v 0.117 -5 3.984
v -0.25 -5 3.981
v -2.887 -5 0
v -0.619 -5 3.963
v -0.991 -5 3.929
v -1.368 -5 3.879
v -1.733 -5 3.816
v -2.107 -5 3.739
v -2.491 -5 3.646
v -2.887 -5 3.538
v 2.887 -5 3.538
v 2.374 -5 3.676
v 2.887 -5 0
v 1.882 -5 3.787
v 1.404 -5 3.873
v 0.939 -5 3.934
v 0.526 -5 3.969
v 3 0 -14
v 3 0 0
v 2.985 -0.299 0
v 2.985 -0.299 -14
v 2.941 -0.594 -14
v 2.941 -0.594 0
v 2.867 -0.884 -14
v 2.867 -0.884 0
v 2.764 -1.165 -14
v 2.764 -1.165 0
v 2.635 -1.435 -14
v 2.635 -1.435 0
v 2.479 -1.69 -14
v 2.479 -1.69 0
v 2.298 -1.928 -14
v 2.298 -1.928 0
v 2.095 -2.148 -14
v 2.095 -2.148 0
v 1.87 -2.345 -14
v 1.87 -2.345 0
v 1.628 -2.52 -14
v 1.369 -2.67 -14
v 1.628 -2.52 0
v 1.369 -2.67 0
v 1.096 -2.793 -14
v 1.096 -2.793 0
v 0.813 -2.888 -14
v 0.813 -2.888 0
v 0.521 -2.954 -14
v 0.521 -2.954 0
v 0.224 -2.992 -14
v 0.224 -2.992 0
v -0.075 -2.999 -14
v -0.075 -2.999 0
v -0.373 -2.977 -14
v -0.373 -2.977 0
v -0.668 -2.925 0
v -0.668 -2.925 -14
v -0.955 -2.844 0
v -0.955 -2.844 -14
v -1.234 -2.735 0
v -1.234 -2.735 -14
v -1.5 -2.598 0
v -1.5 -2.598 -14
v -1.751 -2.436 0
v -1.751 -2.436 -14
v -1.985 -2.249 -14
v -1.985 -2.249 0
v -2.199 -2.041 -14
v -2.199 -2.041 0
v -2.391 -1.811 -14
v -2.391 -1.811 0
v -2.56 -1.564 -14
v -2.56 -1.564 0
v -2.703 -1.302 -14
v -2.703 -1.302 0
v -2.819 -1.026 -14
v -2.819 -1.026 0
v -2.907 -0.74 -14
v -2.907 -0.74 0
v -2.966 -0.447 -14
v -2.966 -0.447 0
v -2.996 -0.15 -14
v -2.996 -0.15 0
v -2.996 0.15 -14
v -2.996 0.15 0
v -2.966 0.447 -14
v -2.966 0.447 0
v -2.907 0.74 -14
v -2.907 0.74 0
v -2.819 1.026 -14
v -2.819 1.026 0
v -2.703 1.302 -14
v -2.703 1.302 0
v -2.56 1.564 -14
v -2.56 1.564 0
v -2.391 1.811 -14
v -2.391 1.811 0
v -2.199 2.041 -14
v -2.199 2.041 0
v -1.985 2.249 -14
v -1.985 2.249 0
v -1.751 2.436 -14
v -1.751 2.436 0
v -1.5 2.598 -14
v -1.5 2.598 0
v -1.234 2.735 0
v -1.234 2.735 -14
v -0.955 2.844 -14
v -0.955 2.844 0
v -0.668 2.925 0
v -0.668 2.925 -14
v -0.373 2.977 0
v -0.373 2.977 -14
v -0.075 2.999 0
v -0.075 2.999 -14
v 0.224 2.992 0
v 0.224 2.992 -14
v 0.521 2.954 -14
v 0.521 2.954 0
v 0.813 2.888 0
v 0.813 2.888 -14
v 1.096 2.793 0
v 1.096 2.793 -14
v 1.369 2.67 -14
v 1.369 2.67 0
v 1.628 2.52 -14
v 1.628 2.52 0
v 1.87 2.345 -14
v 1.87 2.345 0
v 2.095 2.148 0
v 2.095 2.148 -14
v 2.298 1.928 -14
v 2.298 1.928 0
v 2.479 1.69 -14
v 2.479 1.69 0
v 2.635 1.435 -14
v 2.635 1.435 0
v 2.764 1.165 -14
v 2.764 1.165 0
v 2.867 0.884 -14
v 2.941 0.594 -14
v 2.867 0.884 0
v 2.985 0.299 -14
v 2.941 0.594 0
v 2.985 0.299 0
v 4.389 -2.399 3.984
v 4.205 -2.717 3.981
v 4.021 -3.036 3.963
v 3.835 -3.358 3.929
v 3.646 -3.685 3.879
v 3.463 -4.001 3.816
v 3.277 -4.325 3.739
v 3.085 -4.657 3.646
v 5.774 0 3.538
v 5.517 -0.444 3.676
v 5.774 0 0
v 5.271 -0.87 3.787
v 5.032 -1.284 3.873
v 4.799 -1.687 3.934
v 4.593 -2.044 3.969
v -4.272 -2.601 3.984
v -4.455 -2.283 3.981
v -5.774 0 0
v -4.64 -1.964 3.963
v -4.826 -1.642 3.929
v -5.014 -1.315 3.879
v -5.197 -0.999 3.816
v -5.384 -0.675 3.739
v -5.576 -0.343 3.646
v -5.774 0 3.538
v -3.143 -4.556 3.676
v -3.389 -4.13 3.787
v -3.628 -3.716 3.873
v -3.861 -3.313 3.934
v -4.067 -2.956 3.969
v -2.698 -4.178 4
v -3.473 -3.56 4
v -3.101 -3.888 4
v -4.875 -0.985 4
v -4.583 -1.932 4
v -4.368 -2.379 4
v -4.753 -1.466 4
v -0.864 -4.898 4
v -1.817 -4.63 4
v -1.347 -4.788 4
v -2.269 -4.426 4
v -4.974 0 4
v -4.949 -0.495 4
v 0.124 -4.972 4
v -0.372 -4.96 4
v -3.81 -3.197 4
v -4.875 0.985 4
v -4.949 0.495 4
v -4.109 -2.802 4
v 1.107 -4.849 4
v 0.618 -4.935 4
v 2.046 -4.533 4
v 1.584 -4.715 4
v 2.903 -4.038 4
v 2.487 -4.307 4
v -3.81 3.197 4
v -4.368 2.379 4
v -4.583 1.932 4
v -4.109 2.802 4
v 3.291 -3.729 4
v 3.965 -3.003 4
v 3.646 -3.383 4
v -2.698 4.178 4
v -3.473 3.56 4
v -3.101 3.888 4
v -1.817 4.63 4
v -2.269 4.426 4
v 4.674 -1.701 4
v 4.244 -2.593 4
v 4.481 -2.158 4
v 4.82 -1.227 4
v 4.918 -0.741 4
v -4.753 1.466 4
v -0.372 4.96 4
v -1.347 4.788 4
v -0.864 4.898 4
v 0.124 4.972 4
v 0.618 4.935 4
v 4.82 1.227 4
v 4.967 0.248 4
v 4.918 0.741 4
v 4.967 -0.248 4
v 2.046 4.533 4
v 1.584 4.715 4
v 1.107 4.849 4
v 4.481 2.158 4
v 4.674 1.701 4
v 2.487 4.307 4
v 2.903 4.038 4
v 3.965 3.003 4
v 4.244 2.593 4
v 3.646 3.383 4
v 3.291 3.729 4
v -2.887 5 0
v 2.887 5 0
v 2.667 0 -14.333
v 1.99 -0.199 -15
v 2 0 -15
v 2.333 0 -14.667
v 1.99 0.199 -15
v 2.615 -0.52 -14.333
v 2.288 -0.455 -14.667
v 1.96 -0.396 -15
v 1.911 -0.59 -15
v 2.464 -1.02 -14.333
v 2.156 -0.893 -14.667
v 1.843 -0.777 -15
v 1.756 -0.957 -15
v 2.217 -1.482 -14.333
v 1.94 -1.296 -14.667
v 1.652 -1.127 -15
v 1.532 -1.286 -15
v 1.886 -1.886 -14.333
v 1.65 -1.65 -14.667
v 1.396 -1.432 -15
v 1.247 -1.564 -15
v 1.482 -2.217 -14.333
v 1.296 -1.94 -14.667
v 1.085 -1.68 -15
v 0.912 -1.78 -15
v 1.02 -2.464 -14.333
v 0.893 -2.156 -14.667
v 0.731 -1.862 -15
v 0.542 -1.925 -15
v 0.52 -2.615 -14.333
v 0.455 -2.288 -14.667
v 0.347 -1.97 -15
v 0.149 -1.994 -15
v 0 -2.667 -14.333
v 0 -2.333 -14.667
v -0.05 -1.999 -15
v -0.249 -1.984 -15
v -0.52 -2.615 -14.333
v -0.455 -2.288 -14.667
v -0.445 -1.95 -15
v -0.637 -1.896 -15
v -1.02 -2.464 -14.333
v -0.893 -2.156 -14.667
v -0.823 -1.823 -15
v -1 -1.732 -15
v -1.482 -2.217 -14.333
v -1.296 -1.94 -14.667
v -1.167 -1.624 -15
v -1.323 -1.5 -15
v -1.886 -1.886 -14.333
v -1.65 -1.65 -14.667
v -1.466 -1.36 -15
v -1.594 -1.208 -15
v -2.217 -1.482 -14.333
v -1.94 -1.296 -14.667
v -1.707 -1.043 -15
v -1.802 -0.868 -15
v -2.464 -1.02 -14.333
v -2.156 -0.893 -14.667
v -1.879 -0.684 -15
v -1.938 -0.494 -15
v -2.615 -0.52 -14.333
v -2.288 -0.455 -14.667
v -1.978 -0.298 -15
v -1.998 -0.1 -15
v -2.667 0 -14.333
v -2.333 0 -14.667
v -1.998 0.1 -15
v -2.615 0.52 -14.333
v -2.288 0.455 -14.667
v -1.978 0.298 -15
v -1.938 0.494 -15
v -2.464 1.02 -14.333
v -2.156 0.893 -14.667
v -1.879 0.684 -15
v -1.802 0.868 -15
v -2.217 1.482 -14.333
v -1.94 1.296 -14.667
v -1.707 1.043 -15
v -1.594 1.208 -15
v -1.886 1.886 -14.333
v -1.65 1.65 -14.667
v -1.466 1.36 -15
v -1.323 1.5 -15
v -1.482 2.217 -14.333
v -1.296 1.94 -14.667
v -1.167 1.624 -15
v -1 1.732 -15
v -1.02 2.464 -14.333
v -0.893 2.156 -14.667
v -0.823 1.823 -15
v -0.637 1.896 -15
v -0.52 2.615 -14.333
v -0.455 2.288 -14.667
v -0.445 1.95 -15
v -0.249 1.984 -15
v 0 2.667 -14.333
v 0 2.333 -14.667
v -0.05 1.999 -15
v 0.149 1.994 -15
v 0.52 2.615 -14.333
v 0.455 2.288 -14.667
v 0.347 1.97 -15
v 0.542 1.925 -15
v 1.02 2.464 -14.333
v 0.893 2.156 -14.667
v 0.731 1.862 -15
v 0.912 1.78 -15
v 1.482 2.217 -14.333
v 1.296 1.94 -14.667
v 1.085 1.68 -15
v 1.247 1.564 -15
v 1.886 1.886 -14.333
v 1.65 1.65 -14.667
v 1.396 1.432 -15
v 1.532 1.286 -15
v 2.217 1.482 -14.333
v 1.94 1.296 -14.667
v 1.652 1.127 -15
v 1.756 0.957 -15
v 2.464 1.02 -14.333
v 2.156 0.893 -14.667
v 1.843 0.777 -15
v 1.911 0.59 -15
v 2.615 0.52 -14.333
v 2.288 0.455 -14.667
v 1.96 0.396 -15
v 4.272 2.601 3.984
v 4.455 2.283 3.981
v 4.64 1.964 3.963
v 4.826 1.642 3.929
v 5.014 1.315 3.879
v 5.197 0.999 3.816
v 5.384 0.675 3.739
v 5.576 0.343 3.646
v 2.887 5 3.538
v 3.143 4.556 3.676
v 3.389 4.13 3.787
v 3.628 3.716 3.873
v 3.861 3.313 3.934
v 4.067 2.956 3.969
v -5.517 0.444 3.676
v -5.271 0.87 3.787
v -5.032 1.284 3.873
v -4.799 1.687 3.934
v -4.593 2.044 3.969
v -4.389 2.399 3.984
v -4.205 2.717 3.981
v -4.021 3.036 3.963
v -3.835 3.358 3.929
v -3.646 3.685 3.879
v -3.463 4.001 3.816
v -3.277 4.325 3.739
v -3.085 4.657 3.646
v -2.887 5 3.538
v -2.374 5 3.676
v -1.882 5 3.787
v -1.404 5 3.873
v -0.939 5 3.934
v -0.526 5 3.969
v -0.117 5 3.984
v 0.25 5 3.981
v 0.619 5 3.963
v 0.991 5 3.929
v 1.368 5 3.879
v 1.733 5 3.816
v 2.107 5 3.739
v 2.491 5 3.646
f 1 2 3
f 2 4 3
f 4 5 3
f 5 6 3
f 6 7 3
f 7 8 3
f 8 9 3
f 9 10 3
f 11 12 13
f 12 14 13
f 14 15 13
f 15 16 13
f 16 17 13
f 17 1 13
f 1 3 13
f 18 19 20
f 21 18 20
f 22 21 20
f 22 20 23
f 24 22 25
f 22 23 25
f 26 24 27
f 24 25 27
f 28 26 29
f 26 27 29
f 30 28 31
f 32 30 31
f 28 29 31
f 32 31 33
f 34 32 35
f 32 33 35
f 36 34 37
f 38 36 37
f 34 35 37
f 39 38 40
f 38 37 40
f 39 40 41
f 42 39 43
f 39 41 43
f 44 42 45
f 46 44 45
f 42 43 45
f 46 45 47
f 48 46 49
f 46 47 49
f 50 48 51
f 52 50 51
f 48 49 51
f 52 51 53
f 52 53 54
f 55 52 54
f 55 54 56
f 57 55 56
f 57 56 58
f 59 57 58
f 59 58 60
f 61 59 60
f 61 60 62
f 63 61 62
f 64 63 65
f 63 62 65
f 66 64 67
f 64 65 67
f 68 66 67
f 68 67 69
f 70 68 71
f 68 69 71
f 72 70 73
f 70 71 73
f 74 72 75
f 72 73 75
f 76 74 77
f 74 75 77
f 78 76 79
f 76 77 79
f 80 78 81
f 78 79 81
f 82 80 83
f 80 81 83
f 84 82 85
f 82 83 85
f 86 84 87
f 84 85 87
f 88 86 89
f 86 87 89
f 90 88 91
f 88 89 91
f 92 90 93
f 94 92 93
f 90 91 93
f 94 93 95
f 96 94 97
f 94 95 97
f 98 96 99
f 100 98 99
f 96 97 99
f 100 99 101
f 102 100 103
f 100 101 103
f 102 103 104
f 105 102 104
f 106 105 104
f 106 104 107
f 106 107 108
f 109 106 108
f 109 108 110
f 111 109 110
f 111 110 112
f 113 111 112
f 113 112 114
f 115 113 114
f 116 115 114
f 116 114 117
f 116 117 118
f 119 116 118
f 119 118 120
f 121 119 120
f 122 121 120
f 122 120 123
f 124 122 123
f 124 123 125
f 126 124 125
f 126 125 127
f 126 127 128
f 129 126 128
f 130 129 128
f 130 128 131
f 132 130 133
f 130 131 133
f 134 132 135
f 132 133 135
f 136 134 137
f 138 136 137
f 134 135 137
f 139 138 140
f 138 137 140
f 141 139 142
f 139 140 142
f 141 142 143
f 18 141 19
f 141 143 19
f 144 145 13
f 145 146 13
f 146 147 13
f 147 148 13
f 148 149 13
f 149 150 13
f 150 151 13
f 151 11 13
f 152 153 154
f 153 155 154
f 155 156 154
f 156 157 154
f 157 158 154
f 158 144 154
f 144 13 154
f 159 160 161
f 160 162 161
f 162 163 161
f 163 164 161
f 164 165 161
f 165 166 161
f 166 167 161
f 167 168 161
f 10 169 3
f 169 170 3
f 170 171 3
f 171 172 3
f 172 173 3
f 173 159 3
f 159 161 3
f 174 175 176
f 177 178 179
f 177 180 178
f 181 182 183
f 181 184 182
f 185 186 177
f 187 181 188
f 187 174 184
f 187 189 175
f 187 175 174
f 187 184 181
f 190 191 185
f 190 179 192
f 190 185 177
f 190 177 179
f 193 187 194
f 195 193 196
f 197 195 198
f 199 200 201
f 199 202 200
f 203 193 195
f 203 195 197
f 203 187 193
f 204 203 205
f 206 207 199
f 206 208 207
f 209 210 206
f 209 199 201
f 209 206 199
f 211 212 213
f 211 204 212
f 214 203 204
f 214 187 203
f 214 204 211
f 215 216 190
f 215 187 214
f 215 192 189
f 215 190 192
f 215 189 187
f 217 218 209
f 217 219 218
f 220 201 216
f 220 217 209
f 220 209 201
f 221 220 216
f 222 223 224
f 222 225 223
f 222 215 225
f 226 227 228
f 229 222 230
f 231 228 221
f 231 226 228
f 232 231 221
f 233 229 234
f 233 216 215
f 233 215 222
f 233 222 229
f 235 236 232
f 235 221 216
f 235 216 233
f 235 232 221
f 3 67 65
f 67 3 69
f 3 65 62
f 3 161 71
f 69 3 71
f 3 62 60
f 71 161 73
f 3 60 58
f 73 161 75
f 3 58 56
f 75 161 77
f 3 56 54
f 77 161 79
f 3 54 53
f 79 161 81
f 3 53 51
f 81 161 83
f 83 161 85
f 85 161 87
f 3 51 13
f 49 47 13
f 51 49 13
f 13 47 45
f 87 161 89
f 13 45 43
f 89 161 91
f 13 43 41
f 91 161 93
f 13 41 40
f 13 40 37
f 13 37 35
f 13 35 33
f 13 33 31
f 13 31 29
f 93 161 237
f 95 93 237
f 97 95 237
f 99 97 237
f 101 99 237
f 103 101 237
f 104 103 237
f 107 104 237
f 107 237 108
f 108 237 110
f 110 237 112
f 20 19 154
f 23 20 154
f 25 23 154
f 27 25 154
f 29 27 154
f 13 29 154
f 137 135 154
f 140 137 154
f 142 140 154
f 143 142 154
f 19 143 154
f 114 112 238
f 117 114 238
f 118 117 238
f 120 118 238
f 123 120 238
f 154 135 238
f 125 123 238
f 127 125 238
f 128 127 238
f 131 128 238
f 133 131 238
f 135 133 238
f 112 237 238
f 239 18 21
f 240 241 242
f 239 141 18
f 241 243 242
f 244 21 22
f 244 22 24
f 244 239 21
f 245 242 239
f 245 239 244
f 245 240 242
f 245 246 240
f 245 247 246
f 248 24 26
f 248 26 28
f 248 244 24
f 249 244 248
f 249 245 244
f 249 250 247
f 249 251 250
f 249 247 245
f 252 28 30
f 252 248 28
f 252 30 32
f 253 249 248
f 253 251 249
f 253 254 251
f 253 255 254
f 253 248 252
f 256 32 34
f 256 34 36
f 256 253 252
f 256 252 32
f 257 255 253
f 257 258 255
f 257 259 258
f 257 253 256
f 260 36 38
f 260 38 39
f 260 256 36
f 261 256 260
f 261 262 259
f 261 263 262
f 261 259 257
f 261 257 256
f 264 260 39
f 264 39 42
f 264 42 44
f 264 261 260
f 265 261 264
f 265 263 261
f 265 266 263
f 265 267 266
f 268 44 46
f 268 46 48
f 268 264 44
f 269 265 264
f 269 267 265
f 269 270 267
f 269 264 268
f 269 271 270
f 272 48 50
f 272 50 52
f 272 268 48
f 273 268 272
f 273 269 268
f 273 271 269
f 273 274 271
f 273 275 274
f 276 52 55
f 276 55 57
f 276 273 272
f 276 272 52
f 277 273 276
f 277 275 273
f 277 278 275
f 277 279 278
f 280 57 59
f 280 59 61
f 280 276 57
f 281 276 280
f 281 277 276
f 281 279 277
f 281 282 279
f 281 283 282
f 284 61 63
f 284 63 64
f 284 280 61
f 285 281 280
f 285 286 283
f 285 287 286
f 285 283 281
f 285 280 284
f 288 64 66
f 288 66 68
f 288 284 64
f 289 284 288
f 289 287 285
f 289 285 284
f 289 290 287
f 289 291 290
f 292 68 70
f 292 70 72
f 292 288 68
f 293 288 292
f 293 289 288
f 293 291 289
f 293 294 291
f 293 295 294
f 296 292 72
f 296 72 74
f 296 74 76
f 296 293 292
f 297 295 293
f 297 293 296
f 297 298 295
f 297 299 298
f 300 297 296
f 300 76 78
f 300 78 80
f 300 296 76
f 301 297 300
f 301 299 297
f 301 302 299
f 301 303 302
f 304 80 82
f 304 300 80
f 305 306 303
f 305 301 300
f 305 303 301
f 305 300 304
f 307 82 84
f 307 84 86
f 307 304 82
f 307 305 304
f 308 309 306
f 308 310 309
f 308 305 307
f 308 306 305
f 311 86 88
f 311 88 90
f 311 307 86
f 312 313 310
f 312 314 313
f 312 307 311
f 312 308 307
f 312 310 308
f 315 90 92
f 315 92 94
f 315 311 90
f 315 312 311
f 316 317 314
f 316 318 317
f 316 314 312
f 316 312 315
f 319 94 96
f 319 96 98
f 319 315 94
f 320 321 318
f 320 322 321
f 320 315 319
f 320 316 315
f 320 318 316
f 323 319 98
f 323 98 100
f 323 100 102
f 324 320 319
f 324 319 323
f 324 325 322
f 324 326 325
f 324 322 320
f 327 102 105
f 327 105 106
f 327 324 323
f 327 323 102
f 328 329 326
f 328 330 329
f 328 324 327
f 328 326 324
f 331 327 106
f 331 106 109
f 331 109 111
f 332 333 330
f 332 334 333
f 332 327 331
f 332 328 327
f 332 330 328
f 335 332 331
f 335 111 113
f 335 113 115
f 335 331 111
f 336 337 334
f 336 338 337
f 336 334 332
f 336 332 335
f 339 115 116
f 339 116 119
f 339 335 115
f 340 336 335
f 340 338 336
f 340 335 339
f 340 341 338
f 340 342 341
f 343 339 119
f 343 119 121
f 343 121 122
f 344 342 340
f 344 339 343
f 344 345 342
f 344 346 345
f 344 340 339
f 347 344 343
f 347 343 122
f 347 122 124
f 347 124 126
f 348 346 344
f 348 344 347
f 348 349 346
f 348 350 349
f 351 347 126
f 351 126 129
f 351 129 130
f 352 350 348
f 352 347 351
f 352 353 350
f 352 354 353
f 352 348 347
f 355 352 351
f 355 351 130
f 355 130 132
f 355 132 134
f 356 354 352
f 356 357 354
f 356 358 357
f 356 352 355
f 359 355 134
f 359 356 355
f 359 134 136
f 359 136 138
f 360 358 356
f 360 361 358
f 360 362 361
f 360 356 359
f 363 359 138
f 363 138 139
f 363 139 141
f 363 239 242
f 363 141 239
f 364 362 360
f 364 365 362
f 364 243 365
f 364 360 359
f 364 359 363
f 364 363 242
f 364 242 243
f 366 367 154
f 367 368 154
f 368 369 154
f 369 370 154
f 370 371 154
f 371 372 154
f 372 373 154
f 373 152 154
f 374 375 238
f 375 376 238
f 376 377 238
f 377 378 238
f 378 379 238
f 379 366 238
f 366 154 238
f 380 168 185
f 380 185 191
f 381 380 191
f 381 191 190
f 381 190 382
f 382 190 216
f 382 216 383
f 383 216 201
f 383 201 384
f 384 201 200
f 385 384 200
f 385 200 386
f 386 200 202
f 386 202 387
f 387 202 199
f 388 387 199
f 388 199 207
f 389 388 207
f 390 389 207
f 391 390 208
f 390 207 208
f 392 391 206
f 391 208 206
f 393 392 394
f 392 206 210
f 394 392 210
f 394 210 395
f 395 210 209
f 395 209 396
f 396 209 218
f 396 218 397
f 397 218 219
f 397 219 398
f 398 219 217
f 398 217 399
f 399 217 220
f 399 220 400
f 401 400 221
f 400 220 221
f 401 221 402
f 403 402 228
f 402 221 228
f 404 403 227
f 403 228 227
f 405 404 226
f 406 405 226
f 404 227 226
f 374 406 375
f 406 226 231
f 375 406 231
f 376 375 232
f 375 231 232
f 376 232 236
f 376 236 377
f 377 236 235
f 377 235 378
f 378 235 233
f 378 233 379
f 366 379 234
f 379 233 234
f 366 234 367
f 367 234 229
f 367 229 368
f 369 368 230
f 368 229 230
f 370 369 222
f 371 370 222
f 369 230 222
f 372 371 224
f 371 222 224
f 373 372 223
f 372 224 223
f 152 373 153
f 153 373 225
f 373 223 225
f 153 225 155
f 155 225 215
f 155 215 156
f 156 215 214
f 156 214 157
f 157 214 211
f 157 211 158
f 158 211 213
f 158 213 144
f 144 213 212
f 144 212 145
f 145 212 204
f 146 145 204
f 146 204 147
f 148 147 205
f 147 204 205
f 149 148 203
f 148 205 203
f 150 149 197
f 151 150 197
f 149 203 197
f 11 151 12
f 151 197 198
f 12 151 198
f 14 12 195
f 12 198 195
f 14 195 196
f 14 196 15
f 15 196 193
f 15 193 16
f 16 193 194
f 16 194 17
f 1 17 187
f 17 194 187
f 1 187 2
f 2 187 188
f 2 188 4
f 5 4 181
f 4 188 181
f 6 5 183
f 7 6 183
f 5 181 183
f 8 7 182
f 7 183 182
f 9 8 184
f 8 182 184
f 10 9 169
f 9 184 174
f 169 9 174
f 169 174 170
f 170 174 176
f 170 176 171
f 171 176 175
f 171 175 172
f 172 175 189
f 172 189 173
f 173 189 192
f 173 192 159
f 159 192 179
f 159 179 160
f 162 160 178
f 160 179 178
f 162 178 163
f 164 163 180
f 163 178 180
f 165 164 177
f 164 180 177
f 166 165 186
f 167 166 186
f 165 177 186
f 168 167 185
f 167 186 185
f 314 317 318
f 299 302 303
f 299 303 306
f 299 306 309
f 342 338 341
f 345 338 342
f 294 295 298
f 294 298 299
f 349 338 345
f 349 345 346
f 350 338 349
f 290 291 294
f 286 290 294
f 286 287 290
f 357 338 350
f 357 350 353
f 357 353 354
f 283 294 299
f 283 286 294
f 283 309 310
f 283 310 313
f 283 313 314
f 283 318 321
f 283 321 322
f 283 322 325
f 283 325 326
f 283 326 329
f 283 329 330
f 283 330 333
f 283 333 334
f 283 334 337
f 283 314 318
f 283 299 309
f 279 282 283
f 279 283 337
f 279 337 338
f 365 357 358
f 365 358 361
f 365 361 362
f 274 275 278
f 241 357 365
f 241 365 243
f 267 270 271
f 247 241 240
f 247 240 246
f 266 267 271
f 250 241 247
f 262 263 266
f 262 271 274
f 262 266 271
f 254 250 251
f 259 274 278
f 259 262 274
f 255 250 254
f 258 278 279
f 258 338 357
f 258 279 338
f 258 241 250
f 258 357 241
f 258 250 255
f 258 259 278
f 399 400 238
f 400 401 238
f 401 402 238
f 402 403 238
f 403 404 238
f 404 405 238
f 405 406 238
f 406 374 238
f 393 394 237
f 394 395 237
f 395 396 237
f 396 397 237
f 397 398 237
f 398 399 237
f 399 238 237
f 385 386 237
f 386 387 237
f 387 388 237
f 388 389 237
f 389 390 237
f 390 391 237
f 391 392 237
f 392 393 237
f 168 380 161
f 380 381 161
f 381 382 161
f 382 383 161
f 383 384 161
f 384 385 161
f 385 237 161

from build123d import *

# Parameters (mm, degrees)
EXTRUDE_1_DEPTH = 4
SKETCH_2_R      = 3
EXTRUDE_2_DEPTH = 15
CHAMFER_1_SIZE  = 1


with BuildPart() as part:
    # Эскиз1 → Бобышка-Вытянуть1 (new body)
    with BuildSketch(Plane.XY):
        Polygon((5.773502692, 0), (2.886751346, 5), (-2.886751346, 5), (-5.773502692, 0), (-2.886751346, -5), (2.886751346, -5), align=None)
    extrude(amount=EXTRUDE_1_DEPTH)

    # Эскиз2 → Бобышка-Вытянуть2 (add)
    with BuildSketch(Plane(origin=(0, 0, 0), x_dir=(-1, 0, 0), z_dir=(0, 0, -1))):
        with Locations(Location((0, 0, 0), (0, 0, 180))):
            Circle(SKETCH_2_R)
    extrude(amount=EXTRUDE_2_DEPTH)

    # Фаска1
    chamfer_1_edges = [part.edges().sort_by_distance(p)[0] for p in [
        (-3, 0, -15),
    ]]
    chamfer(chamfer_1_edges, length=CHAMFER_1_SIZE)

    # Эскиз3 → Вырез-Повернуть1 (revolve, cut)
    with BuildSketch(Plane(origin=(0, 0, 0), x_dir=(1, 0, 0), z_dir=(0, 1, 0))):
        Polygon((-10.773502692, -0.651368439), (-4.973502692, -4), (-10.773502692, -4), align=None)
    revolve(axis=Axis((0, 0, 4), (0, 0, -1)), mode=Mode.SUBTRACT)


solid = part.part
